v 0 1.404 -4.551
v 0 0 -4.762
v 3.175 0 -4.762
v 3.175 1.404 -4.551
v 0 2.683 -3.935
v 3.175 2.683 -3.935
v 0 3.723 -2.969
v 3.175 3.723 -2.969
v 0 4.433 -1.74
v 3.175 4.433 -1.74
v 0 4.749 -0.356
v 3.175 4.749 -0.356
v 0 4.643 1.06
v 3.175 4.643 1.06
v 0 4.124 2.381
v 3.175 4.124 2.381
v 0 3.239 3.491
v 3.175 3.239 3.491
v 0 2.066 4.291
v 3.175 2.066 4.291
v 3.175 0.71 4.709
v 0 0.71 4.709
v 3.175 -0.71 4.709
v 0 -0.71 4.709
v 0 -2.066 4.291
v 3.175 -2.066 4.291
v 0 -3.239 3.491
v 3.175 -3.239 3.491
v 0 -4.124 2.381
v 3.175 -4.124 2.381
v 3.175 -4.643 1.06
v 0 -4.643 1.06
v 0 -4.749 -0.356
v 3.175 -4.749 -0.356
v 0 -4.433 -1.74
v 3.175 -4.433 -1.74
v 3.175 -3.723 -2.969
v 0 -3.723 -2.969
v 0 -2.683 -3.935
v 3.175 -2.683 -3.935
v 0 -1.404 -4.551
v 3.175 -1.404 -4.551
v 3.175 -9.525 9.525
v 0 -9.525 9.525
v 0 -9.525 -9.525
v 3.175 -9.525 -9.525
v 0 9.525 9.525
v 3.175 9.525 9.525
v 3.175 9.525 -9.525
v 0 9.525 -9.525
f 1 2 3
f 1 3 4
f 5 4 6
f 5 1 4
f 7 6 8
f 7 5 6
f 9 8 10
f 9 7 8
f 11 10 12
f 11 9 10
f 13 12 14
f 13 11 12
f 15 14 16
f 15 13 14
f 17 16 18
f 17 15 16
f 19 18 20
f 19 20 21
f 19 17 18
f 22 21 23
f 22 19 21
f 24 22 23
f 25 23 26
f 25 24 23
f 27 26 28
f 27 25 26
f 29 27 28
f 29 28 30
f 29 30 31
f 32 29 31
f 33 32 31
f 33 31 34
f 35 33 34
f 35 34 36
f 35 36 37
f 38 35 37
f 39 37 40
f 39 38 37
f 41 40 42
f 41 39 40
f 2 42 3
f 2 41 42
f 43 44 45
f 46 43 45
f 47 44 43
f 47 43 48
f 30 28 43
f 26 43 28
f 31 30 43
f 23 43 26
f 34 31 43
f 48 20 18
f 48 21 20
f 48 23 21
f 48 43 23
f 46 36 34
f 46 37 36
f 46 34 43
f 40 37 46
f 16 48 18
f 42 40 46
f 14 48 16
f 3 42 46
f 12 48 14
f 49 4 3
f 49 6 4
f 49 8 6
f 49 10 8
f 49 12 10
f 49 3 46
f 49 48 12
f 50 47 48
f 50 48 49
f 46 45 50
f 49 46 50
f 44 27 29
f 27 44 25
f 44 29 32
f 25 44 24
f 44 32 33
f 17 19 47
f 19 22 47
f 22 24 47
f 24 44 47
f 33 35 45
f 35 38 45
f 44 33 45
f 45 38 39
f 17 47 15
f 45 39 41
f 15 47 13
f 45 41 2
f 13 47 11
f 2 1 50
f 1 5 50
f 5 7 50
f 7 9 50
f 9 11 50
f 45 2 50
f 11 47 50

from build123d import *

# Parameters (mm, degrees)
SKETCH1_W           = 19.05
SKETCH1_H           = 19.05
SKETCH1_R           = 4.7625
BOSS_EXTRUDE1_DEPTH = 3.175


with BuildPart() as part:
    # Sketch1 → Boss-Extrude1 (new body)
    with BuildSketch(Plane(origin=(0, 0, 0), x_dir=(0, 0, -1), z_dir=(1, 0, 0))):
        Rectangle(SKETCH1_W, SKETCH1_H)
        Circle(SKETCH1_R, mode=Mode.SUBTRACT)
    extrude(amount=BOSS_EXTRUDE1_DEPTH)


solid = part.part
